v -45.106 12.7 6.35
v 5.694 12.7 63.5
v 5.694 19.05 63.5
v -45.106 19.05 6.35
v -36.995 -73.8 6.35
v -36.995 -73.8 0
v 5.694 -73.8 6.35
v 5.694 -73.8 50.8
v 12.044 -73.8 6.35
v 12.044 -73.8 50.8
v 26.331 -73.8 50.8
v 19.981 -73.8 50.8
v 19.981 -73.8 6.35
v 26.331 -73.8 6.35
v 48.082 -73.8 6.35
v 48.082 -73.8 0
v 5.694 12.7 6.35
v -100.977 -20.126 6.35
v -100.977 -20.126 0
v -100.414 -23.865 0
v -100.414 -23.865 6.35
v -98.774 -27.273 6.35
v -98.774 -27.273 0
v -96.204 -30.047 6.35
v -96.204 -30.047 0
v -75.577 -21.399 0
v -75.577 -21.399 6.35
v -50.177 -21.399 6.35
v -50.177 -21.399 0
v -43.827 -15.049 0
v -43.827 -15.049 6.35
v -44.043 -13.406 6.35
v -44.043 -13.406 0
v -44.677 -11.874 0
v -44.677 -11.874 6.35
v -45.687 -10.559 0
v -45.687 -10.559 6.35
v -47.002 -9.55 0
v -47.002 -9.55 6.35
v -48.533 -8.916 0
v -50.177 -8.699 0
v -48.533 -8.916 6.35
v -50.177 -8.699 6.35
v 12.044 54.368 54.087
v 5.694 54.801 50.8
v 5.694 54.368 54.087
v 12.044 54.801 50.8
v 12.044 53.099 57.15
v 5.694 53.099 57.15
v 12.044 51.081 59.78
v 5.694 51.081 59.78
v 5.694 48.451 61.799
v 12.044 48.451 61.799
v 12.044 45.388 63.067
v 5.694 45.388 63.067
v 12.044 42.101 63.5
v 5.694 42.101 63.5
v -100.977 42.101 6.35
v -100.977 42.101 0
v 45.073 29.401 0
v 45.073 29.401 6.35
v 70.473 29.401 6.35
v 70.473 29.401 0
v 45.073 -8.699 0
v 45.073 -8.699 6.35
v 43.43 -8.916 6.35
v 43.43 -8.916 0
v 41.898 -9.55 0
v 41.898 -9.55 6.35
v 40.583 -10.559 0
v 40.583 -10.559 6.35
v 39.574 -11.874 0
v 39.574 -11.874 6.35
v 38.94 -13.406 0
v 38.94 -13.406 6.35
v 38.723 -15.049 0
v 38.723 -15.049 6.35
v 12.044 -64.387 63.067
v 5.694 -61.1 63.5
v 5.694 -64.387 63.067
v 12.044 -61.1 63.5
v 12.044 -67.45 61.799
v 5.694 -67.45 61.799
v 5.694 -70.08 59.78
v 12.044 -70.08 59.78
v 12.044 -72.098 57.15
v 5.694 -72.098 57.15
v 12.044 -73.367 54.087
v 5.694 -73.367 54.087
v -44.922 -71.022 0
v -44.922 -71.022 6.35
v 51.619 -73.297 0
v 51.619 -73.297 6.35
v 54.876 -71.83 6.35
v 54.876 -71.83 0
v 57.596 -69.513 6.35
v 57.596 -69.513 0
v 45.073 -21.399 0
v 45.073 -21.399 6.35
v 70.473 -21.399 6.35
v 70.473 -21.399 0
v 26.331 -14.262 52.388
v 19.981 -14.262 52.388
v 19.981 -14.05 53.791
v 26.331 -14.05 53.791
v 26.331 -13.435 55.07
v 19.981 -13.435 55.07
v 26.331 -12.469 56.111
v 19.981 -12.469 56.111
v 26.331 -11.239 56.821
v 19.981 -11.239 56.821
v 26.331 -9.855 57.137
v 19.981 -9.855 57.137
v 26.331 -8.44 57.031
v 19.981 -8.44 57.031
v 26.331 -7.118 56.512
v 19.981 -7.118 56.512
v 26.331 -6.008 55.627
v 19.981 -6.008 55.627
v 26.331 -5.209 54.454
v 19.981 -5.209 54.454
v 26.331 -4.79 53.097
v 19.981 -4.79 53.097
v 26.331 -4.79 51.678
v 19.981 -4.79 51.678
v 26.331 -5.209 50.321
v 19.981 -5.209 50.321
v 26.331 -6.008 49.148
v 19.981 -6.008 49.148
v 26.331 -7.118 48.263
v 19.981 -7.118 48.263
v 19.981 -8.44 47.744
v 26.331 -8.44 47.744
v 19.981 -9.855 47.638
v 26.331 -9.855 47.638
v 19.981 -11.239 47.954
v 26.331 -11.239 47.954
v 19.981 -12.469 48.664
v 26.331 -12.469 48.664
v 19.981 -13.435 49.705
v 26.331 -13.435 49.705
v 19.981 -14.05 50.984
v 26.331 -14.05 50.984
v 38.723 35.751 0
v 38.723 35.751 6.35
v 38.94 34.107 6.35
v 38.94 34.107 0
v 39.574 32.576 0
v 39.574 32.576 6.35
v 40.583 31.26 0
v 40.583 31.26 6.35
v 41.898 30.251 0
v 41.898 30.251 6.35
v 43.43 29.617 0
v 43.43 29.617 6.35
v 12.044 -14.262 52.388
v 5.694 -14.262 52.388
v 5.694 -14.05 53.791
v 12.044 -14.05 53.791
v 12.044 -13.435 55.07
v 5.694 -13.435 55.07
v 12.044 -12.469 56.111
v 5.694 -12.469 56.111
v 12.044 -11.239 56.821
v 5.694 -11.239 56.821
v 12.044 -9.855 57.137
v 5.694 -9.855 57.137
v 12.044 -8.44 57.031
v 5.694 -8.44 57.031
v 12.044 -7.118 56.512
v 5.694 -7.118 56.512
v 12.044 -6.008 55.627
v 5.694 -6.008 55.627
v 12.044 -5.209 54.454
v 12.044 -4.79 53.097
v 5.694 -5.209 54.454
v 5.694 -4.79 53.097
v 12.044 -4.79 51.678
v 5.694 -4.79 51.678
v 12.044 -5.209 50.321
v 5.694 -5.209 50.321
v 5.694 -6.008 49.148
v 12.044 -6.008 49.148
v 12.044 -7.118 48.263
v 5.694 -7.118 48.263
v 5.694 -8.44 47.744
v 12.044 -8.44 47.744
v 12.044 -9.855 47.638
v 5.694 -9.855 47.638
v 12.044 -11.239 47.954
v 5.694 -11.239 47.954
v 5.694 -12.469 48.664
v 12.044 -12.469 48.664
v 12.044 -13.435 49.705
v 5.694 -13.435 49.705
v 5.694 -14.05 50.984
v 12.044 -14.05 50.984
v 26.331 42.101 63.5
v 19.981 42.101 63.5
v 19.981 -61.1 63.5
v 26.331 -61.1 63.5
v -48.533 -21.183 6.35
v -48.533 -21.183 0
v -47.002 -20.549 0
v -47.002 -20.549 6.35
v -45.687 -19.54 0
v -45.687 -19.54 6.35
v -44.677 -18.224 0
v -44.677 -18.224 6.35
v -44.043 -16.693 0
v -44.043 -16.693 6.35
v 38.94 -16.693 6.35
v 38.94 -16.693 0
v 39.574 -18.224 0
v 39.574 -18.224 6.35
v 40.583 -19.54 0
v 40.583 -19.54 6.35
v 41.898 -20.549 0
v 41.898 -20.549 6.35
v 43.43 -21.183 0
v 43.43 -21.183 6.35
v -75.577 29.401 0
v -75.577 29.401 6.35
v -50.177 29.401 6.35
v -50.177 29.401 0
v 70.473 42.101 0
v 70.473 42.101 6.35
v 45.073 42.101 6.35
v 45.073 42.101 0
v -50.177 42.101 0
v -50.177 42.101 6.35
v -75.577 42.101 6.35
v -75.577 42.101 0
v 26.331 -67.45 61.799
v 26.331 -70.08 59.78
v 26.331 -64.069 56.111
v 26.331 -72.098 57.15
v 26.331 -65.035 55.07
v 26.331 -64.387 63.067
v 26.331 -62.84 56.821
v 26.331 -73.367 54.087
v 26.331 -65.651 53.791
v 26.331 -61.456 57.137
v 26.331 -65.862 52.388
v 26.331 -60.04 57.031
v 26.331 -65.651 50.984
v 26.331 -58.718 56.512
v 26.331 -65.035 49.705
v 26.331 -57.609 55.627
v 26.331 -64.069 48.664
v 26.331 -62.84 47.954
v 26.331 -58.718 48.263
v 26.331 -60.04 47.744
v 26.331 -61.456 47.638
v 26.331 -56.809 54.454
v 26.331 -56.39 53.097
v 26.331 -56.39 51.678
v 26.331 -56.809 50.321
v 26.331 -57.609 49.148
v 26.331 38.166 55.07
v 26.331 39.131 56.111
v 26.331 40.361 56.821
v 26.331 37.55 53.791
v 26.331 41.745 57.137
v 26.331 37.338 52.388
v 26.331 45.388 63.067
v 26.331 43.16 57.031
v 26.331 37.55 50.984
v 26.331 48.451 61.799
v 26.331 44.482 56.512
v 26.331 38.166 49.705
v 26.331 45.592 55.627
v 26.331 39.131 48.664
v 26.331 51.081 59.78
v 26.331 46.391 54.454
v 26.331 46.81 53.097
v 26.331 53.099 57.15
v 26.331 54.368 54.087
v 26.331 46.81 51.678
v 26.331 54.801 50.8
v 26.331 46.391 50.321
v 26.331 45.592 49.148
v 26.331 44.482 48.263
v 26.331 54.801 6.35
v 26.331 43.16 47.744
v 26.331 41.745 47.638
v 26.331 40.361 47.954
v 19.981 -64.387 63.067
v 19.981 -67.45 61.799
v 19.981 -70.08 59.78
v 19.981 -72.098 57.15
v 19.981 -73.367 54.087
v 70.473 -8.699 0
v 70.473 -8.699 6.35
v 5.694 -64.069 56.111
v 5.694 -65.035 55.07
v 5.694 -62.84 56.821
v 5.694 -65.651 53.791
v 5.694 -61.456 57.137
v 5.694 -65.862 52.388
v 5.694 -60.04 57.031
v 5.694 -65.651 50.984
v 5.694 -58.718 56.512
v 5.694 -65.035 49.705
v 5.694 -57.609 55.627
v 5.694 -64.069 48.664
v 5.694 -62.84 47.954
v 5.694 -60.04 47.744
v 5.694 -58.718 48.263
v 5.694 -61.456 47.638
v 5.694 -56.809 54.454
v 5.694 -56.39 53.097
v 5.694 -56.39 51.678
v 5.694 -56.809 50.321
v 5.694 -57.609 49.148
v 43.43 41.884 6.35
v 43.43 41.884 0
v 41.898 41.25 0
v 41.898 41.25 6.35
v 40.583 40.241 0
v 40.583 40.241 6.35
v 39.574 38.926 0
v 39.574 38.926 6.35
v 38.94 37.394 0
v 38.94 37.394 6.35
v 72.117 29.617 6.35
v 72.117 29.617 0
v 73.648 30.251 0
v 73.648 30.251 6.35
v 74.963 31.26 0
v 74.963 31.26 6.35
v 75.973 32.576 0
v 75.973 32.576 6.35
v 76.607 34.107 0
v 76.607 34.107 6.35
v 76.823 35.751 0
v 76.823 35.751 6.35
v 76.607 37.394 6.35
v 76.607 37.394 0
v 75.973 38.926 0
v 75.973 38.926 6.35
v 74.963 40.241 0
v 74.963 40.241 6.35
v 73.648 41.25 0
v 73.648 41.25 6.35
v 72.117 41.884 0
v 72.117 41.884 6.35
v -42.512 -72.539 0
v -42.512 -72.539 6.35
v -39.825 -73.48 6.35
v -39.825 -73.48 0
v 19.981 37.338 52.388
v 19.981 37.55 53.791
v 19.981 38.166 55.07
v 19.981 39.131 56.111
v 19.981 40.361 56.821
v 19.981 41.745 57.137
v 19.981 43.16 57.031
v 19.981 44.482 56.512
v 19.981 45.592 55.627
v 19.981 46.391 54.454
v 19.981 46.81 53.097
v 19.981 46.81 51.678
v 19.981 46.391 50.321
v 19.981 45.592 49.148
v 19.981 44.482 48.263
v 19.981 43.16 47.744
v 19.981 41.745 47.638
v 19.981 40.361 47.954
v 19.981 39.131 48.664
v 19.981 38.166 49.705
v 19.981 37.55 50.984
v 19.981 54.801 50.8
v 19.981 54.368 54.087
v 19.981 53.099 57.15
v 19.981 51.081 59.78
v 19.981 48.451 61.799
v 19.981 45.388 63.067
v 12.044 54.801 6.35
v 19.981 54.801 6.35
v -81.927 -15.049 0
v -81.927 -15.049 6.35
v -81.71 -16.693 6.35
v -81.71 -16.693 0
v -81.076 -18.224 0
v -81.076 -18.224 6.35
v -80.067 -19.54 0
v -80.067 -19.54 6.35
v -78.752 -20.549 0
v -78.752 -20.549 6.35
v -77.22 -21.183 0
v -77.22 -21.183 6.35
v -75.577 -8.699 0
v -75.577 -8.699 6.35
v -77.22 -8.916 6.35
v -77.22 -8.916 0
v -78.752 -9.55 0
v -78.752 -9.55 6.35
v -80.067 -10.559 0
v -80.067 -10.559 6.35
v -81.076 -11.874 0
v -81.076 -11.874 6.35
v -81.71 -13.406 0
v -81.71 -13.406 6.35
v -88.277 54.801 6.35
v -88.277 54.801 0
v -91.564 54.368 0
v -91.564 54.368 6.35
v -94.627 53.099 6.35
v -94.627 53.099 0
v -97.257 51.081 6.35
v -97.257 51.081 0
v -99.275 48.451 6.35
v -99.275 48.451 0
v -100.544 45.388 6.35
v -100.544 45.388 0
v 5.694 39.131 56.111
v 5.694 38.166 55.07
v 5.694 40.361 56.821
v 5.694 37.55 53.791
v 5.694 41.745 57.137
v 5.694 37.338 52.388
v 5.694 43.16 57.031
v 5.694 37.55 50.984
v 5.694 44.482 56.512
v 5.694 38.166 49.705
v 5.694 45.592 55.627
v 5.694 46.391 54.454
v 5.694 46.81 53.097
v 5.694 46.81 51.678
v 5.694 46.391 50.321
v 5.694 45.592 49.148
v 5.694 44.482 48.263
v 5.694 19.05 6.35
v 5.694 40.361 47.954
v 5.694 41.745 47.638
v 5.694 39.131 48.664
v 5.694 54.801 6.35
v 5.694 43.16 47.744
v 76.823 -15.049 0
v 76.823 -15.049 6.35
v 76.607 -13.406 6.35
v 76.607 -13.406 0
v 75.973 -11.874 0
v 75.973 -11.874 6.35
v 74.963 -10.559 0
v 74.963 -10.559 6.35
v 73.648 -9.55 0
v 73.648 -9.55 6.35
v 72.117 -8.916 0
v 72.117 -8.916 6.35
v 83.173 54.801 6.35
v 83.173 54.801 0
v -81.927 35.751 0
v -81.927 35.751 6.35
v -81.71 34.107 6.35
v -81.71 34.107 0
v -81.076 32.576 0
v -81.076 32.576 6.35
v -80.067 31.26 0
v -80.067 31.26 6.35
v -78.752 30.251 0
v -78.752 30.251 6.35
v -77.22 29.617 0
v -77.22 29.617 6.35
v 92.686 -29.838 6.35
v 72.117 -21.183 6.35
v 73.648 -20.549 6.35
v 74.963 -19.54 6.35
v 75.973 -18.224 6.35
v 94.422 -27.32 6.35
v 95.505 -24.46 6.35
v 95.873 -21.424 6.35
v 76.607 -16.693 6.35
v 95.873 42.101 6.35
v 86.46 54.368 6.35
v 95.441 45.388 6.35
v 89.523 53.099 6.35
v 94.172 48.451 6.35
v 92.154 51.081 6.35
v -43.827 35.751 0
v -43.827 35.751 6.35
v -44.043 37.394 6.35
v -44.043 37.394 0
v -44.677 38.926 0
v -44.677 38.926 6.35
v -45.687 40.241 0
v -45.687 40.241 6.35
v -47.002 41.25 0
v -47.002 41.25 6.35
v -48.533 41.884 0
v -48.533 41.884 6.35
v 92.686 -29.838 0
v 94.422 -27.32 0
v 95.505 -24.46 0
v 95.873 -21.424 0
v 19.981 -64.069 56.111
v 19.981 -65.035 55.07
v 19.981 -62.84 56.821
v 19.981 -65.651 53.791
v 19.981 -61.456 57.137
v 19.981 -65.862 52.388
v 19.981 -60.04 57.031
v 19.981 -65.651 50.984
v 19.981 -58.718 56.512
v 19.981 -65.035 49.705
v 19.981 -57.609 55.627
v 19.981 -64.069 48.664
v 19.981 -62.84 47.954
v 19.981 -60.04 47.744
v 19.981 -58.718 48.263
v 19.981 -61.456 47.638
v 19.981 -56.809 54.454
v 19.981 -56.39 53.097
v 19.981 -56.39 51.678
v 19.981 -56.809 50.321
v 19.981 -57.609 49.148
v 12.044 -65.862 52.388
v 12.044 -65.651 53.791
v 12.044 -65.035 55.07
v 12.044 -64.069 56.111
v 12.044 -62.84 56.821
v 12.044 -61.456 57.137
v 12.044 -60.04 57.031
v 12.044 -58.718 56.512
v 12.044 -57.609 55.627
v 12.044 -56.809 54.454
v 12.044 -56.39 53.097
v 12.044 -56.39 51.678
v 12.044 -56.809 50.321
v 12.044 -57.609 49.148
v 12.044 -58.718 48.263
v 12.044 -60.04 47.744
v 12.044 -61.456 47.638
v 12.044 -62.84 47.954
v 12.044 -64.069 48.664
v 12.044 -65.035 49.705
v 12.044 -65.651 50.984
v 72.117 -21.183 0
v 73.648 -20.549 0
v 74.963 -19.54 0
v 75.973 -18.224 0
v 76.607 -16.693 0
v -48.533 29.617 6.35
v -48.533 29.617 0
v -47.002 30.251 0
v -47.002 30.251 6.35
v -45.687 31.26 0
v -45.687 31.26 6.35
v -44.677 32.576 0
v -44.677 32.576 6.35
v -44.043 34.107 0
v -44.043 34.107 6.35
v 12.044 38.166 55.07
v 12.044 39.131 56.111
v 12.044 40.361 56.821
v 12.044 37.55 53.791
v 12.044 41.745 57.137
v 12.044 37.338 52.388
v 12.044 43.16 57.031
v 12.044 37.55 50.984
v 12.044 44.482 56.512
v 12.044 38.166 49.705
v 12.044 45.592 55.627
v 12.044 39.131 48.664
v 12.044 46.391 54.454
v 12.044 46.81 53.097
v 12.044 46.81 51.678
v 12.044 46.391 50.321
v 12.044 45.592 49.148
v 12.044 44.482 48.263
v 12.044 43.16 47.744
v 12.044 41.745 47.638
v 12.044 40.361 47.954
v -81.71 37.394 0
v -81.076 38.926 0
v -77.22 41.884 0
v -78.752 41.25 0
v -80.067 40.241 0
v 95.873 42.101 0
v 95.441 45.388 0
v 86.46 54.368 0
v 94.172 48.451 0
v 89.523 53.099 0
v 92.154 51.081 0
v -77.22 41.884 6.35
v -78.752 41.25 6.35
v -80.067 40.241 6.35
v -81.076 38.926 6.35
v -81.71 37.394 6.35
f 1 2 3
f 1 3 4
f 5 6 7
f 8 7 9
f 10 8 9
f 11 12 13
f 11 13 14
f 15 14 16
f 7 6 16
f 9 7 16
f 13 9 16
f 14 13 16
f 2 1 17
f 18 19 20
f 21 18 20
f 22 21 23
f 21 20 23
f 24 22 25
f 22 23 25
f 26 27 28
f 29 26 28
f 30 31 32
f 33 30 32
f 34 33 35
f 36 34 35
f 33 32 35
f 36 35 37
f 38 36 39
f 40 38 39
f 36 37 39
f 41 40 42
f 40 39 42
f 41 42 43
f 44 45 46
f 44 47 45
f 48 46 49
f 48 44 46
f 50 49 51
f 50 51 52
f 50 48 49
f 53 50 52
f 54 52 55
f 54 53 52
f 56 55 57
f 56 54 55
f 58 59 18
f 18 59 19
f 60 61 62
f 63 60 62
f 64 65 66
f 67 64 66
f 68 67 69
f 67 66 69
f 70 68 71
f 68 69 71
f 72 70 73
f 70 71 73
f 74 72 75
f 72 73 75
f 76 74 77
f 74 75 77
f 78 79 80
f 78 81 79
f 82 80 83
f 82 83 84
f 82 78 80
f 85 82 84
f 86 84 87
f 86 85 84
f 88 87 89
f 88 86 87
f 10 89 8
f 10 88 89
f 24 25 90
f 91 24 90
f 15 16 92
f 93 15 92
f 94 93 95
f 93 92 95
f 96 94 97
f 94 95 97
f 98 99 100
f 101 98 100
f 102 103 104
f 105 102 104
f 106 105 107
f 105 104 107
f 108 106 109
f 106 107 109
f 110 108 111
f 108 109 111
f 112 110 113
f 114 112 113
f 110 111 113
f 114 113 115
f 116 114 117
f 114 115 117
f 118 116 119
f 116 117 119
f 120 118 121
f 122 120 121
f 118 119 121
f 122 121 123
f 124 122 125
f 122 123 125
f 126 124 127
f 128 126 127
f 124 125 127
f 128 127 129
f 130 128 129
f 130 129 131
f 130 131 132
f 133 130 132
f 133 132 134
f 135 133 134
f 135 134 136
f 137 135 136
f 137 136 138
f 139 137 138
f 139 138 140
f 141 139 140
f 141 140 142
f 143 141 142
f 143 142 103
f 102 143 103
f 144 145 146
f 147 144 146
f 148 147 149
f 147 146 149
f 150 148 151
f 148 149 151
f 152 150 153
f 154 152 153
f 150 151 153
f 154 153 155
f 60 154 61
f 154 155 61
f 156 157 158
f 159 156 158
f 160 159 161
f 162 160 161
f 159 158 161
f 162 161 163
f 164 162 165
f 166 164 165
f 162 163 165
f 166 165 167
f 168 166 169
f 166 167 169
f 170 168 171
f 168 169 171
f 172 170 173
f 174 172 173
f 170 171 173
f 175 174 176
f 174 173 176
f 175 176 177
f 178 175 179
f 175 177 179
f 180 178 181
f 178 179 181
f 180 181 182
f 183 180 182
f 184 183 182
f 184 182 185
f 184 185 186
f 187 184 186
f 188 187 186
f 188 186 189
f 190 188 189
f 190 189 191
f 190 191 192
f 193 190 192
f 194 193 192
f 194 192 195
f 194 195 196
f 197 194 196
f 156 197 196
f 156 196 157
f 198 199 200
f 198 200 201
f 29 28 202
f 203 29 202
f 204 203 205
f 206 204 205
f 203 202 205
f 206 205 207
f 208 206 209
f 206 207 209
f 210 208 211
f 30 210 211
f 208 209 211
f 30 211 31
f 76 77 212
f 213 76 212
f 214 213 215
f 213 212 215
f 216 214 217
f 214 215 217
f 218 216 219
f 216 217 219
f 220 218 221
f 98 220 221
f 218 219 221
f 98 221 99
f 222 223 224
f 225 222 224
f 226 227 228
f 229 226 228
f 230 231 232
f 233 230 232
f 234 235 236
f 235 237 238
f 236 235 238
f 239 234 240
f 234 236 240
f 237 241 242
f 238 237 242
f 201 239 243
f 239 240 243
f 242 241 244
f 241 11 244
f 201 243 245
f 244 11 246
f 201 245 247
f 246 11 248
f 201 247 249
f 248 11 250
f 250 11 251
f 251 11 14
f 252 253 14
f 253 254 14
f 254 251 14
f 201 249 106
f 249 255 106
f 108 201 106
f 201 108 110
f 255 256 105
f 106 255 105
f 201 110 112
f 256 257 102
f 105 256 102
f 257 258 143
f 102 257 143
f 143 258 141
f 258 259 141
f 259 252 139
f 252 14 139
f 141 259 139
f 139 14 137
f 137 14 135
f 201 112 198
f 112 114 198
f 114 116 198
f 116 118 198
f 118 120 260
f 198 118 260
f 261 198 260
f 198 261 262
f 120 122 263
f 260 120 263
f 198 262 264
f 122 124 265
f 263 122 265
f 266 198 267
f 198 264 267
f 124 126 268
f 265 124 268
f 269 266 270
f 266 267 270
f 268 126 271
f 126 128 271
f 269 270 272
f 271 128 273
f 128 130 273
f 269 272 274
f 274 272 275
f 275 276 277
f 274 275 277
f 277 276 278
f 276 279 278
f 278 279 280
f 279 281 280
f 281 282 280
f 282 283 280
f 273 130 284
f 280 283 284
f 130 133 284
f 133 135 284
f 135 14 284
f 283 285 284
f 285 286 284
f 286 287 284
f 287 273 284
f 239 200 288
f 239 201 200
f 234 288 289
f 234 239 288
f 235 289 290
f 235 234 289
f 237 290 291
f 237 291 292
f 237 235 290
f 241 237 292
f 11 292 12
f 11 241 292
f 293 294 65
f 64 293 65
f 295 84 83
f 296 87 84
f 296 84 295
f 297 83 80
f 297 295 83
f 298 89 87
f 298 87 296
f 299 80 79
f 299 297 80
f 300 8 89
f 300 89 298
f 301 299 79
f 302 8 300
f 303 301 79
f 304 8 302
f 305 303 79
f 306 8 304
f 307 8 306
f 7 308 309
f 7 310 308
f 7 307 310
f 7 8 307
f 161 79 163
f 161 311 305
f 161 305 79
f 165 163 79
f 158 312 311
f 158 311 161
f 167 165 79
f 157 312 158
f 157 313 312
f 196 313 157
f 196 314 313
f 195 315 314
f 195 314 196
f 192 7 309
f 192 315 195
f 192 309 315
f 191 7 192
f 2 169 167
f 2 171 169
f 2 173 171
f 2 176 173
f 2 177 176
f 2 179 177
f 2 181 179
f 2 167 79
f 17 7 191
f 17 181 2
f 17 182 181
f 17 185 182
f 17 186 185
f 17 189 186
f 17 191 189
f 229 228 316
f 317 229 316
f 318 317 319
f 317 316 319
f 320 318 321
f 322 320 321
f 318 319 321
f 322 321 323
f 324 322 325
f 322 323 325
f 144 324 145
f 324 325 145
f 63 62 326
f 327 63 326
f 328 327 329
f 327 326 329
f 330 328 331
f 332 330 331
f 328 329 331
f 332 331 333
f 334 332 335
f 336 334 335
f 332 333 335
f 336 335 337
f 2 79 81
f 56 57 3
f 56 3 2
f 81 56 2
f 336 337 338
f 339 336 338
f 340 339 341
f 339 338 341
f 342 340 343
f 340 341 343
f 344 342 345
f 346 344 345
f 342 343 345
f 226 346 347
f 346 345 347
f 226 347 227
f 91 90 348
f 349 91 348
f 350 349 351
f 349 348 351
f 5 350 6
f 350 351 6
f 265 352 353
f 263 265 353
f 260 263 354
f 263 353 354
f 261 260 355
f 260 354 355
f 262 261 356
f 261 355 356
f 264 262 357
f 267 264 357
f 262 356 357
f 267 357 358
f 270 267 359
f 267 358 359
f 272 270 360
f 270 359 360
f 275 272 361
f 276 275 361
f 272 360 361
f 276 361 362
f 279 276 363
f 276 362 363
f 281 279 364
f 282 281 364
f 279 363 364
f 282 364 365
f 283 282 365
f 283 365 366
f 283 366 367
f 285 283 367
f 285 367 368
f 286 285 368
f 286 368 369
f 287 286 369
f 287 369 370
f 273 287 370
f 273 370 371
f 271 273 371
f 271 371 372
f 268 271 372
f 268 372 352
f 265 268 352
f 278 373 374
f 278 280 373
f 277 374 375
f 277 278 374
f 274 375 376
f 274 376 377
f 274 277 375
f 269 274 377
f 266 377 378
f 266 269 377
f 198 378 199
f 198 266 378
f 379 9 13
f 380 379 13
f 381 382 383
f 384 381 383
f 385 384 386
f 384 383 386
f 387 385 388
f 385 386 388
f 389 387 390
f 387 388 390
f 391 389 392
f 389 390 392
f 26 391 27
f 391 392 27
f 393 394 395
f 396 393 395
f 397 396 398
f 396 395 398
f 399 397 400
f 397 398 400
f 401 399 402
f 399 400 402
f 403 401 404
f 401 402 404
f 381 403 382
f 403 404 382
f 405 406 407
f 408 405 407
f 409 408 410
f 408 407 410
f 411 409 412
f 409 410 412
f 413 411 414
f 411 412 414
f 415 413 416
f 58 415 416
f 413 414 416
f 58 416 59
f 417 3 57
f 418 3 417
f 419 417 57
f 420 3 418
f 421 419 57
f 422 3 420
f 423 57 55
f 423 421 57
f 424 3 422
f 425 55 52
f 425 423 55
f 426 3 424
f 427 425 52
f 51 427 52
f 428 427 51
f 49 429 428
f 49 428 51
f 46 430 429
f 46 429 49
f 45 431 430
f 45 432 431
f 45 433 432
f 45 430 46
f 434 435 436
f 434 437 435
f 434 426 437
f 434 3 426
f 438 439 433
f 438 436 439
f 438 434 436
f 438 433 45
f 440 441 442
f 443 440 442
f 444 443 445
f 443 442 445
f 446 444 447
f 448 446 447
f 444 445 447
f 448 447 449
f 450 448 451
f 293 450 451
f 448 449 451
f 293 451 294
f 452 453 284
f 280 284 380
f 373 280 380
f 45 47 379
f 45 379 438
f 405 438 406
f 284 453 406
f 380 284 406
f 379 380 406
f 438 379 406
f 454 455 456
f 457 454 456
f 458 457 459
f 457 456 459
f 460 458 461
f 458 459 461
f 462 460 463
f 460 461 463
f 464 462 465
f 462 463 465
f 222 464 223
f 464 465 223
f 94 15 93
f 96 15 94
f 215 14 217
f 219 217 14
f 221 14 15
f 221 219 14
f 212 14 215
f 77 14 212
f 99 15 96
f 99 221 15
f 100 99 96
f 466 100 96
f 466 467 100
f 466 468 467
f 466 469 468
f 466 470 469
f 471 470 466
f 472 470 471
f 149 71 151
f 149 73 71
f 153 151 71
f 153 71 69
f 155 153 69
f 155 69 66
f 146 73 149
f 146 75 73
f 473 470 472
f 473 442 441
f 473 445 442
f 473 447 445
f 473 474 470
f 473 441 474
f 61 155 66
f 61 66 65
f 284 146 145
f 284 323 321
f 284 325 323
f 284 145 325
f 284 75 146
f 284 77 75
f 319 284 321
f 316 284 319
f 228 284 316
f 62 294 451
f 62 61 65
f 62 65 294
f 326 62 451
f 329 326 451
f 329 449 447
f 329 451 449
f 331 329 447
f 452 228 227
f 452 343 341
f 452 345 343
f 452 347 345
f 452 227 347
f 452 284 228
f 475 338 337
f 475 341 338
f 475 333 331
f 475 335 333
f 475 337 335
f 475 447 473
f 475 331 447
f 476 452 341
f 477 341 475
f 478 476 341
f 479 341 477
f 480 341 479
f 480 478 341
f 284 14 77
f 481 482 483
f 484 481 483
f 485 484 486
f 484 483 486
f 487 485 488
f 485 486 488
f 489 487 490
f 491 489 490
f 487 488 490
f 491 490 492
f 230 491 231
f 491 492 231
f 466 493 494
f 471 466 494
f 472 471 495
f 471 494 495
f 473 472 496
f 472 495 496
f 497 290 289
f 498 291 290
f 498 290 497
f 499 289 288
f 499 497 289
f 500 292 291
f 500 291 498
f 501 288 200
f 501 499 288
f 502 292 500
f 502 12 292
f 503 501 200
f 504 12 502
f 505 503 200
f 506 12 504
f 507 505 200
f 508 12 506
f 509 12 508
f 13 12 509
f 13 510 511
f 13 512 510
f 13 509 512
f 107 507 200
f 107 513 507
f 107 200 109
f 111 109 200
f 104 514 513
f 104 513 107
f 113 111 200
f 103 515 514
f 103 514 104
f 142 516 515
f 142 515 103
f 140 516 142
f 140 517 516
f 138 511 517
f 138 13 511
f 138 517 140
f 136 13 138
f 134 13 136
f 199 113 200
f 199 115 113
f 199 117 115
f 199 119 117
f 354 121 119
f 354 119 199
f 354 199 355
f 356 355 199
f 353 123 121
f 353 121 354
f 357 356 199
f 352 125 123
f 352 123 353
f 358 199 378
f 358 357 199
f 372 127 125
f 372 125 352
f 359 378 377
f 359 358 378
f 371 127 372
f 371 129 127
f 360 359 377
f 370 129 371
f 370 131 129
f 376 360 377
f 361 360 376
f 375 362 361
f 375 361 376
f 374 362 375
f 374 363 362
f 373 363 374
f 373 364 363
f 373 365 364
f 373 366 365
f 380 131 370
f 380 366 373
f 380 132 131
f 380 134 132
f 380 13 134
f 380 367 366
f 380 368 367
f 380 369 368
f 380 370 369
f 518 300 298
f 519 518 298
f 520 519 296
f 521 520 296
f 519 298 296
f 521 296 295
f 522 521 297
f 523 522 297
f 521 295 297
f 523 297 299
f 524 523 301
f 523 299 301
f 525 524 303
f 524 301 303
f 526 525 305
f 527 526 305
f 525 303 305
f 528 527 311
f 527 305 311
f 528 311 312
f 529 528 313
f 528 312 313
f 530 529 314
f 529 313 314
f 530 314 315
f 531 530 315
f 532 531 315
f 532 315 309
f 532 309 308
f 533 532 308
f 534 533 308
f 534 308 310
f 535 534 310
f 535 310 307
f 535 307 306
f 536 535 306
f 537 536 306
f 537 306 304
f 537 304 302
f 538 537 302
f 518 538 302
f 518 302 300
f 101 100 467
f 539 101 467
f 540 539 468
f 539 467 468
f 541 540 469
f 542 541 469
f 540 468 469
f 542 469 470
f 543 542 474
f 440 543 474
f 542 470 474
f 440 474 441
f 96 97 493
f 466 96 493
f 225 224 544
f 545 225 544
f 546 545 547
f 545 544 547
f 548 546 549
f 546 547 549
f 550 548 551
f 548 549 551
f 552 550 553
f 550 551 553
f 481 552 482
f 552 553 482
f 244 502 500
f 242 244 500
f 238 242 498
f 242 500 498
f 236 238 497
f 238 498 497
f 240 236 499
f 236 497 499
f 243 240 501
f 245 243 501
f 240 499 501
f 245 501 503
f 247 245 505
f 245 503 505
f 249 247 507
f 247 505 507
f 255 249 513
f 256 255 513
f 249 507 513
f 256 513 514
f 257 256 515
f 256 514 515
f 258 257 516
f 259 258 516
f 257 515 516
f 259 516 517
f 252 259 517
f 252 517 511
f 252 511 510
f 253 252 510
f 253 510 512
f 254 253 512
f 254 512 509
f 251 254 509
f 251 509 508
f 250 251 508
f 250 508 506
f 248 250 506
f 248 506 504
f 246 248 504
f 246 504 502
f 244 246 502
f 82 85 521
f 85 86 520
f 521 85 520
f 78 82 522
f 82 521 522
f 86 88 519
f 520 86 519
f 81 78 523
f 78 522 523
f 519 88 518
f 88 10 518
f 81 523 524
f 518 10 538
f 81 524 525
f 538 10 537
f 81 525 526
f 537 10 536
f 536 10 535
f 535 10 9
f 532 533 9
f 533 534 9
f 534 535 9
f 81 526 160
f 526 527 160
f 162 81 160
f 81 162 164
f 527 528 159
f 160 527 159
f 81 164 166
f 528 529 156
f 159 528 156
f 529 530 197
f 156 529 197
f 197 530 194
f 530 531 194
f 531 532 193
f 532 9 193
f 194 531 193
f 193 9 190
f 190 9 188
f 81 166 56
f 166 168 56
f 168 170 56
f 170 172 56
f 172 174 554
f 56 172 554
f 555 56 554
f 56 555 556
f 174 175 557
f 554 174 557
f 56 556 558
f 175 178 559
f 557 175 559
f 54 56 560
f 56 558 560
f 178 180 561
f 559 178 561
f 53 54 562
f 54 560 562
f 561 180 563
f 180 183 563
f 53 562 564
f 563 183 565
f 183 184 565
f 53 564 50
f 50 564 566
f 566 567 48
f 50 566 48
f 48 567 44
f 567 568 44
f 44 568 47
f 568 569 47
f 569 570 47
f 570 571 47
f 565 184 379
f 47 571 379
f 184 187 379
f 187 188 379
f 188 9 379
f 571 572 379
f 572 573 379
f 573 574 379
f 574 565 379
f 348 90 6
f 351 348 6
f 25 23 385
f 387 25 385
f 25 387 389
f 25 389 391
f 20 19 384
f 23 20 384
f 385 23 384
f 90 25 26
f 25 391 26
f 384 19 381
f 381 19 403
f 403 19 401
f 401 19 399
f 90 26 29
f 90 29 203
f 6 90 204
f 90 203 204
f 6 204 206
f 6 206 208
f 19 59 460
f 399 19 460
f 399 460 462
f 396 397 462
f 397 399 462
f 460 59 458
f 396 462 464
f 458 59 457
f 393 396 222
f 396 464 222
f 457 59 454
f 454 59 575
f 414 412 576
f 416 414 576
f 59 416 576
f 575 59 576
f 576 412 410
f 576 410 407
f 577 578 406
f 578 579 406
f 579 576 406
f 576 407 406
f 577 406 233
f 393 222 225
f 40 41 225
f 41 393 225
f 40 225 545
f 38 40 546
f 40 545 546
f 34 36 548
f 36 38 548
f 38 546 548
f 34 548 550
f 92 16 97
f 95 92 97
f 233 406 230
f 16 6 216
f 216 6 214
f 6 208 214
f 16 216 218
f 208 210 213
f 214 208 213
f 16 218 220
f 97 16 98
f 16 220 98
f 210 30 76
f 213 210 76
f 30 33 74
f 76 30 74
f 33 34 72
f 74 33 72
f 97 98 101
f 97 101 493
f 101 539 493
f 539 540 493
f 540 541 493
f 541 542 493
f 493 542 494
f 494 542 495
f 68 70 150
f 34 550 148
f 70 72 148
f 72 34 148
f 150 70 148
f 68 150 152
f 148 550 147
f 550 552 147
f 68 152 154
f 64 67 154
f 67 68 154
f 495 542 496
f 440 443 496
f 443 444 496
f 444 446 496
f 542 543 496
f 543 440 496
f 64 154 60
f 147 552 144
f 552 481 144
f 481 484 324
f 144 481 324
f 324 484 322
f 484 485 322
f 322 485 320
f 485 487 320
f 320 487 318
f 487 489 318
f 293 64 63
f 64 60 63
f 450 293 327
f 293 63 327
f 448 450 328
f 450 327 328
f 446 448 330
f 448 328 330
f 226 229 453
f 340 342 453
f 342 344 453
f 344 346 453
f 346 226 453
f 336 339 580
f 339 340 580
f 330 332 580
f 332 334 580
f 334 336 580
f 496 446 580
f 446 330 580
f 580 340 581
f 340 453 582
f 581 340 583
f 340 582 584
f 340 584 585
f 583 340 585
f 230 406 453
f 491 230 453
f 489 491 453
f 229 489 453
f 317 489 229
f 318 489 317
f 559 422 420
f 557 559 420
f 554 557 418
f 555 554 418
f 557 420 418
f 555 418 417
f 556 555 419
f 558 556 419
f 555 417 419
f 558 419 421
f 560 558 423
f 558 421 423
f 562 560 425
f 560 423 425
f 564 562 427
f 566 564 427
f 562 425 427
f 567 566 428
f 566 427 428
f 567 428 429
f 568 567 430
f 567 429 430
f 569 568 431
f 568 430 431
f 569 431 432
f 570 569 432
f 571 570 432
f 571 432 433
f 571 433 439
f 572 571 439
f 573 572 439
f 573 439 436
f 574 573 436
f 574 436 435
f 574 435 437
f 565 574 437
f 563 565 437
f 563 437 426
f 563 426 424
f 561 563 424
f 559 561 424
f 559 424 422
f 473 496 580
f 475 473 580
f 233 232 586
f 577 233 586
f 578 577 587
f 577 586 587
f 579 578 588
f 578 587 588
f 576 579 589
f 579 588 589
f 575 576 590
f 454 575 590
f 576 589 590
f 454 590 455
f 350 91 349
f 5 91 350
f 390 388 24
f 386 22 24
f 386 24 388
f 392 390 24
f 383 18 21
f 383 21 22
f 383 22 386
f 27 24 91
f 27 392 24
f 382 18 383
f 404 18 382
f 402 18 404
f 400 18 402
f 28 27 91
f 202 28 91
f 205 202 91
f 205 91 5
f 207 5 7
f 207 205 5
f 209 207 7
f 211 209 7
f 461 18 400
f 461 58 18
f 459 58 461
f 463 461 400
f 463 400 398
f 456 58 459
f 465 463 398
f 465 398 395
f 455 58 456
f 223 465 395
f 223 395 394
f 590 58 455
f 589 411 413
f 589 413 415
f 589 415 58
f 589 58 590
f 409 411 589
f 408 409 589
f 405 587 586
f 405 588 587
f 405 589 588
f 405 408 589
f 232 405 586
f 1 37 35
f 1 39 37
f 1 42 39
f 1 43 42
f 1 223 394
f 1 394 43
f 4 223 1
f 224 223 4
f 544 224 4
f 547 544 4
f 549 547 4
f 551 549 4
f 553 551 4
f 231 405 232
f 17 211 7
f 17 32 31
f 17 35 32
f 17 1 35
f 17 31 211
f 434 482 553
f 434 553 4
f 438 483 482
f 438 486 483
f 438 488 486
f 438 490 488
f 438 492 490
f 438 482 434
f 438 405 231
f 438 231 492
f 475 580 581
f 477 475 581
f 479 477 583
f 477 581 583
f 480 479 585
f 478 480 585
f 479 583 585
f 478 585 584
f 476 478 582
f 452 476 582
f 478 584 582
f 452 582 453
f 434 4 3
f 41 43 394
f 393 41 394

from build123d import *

# Parameters (mm, degrees)
F1_DEPTH  = 6.35
F3_DEPTH  = 6.351
F4_W      = 6.35
F4_H      = 128.6002
F5_DEPTH  = 57.15
F6_R      = 4.7625
F7_DEPTH  = 90.18069
F10_DEPTH = 6.35
F11_R     = 12.7


with BuildPart() as f1:
    # F0 (on Top) → F1 (new body)
    with BuildSketch(Plane.XY):
        with BuildLine():
            Line((83.173356, 54.800538), (-88.276644, 54.800538))
            ThreePointArc((-88.276644, 54.800538), (-97.2569, 51.080794), (-100.976644, 42.100538))
            Line((-100.976644, 42.100538), (-100.976644, -20.125523))
            ThreePointArc((-100.976644, -20.125523), (-99.721515, -25.630513), (-96.204216, -30.047398))
            Line((-96.204216, -30.047398), (-44.922399, -71.021537))
            ThreePointArc((-44.922399, -71.021537), (-41.194957, -73.085024), (-36.994827, -73.799662))
            Line((-36.994827, -73.799662), (48.082449, -73.799662))
            ThreePointArc((48.082449, -73.799662), (53.299506, -72.678622), (57.595535, -69.513412))
            Line((57.595535, -69.513412), (92.686442, -29.837545))
            ThreePointArc((92.686442, -29.837545), (95.049934, -25.922339), (95.873356, -21.423795))
            Line((95.873356, -21.423795), (95.873356, 42.100538))
            ThreePointArc((95.873356, 42.100538), (92.153612, 51.080794), (83.173356, 54.800538))
        make_face()
    extrude(amount=F1_DEPTH)

    # F2 (on face) → F3 (cut, through all)
    with BuildSketch(Plane.XY.offset(6.35)):
        with BuildLine():
            ThreePointArc((-43.826644, -15.049462), (-45.686516, -10.559334), (-50.176644, -8.699462))
            Line((-50.176644, -8.699462), (-75.576644, -8.699462))
            ThreePointArc((-75.576644, -8.699462), (-80.066772, -10.559334), (-81.926644, -15.049462))
            ThreePointArc((-81.926644, -15.049462), (-80.066772, -19.53959), (-75.576644, -21.399462))
            Line((-75.576644, -21.399462), (-50.176644, -21.399462))
            ThreePointArc((-50.176644, -21.399462), (-45.686516, -19.53959), (-43.826644, -15.049462))
        make_face()
        with BuildLine():
            ThreePointArc((76.823356, -15.049462), (74.963484, -10.559334), (70.473356, -8.699462))
            Line((70.473356, -8.699462), (45.073356, -8.699462))
            ThreePointArc((45.073356, -8.699462), (40.583228, -10.559334), (38.723356, -15.049462))
            ThreePointArc((38.723356, -15.049462), (40.583228, -19.53959), (45.073356, -21.399462))
            Line((45.073356, -21.399462), (70.473356, -21.399462))
            ThreePointArc((70.473356, -21.399462), (74.963484, -19.53959), (76.823356, -15.049462))
        make_face()
        with BuildLine():
            Line((70.473356, 42.100538), (45.073356, 42.100538))
            ThreePointArc((45.073356, 42.100538), (40.583228, 40.240666), (38.723356, 35.750538))
            ThreePointArc((38.723356, 35.750538), (40.583228, 31.26041), (45.073356, 29.400538))
            Line((45.073356, 29.400538), (70.473356, 29.400538))
            ThreePointArc((70.473356, 29.400538), (74.963484, 31.26041), (76.823356, 35.750538))
            ThreePointArc((76.823356, 35.750538), (74.963484, 40.240666), (70.473356, 42.100538))
        make_face()
        with BuildLine():
            Line((-50.176644, 42.100538), (-75.576644, 42.100538))
            ThreePointArc((-75.576644, 42.100538), (-80.066772, 40.240666), (-81.926644, 35.750538))
            ThreePointArc((-81.926644, 35.750538), (-80.066772, 31.26041), (-75.576644, 29.400538))
            Line((-75.576644, 29.400538), (-50.176644, 29.400538))
            ThreePointArc((-50.176644, 29.400538), (-45.686516, 31.26041), (-43.826644, 35.750538))
            ThreePointArc((-43.826644, 35.750538), (-45.686516, 40.240666), (-50.176644, 42.100538))
        make_face()
    extrude(amount=-F3_DEPTH, mode=Mode.SUBTRACT)

    # F4 (on face) → F5 (join)
    with BuildSketch(Plane.XY.offset(6.35)):
        with Locations((8.868666, -9.499562)):
            Rectangle(F4_W, F4_H)
        with Locations((23.156166, -9.499562)):
            Rectangle(F4_W, F4_H)
    extrude(amount=F5_DEPTH)

    # F6 (on face) → F7 (cut, through all)
    with BuildSketch(Plane(origin=(5.693666, 0, 0), x_dir=(0, -1, 0), z_dir=(-1, 0, 0))):
        with Locations((-42.100538, 52.3875)):
            Circle(F6_R)
        with Locations((9.499562, 52.3875)):
            Circle(F6_R)
        with Locations((61.099662, 52.3875)):
            Circle(F6_R)
    extrude(amount=-F7_DEPTH, mode=Mode.SUBTRACT)

    # F9 (on offset) → F10 (join)
    with BuildSketch(Plane.XZ.offset(-12.7)):
        Polygon((5.693666, 6.35), (5.693666, 63.5), (-45.106334, 6.35), align=None)
    extrude(amount=-F10_DEPTH)

    # F11
    f11_edges = [f1.edges().sort_by_distance(p)[0] for p in [
        (8.868666, -73.799662, 63.5),
        (23.156166, -73.799662, 63.5),
        (23.156166, 54.800538, 63.5),
        (8.868666, 54.800538, 63.5),
    ]]
    fillet(f11_edges, radius=F11_R)


solid = f1.part
